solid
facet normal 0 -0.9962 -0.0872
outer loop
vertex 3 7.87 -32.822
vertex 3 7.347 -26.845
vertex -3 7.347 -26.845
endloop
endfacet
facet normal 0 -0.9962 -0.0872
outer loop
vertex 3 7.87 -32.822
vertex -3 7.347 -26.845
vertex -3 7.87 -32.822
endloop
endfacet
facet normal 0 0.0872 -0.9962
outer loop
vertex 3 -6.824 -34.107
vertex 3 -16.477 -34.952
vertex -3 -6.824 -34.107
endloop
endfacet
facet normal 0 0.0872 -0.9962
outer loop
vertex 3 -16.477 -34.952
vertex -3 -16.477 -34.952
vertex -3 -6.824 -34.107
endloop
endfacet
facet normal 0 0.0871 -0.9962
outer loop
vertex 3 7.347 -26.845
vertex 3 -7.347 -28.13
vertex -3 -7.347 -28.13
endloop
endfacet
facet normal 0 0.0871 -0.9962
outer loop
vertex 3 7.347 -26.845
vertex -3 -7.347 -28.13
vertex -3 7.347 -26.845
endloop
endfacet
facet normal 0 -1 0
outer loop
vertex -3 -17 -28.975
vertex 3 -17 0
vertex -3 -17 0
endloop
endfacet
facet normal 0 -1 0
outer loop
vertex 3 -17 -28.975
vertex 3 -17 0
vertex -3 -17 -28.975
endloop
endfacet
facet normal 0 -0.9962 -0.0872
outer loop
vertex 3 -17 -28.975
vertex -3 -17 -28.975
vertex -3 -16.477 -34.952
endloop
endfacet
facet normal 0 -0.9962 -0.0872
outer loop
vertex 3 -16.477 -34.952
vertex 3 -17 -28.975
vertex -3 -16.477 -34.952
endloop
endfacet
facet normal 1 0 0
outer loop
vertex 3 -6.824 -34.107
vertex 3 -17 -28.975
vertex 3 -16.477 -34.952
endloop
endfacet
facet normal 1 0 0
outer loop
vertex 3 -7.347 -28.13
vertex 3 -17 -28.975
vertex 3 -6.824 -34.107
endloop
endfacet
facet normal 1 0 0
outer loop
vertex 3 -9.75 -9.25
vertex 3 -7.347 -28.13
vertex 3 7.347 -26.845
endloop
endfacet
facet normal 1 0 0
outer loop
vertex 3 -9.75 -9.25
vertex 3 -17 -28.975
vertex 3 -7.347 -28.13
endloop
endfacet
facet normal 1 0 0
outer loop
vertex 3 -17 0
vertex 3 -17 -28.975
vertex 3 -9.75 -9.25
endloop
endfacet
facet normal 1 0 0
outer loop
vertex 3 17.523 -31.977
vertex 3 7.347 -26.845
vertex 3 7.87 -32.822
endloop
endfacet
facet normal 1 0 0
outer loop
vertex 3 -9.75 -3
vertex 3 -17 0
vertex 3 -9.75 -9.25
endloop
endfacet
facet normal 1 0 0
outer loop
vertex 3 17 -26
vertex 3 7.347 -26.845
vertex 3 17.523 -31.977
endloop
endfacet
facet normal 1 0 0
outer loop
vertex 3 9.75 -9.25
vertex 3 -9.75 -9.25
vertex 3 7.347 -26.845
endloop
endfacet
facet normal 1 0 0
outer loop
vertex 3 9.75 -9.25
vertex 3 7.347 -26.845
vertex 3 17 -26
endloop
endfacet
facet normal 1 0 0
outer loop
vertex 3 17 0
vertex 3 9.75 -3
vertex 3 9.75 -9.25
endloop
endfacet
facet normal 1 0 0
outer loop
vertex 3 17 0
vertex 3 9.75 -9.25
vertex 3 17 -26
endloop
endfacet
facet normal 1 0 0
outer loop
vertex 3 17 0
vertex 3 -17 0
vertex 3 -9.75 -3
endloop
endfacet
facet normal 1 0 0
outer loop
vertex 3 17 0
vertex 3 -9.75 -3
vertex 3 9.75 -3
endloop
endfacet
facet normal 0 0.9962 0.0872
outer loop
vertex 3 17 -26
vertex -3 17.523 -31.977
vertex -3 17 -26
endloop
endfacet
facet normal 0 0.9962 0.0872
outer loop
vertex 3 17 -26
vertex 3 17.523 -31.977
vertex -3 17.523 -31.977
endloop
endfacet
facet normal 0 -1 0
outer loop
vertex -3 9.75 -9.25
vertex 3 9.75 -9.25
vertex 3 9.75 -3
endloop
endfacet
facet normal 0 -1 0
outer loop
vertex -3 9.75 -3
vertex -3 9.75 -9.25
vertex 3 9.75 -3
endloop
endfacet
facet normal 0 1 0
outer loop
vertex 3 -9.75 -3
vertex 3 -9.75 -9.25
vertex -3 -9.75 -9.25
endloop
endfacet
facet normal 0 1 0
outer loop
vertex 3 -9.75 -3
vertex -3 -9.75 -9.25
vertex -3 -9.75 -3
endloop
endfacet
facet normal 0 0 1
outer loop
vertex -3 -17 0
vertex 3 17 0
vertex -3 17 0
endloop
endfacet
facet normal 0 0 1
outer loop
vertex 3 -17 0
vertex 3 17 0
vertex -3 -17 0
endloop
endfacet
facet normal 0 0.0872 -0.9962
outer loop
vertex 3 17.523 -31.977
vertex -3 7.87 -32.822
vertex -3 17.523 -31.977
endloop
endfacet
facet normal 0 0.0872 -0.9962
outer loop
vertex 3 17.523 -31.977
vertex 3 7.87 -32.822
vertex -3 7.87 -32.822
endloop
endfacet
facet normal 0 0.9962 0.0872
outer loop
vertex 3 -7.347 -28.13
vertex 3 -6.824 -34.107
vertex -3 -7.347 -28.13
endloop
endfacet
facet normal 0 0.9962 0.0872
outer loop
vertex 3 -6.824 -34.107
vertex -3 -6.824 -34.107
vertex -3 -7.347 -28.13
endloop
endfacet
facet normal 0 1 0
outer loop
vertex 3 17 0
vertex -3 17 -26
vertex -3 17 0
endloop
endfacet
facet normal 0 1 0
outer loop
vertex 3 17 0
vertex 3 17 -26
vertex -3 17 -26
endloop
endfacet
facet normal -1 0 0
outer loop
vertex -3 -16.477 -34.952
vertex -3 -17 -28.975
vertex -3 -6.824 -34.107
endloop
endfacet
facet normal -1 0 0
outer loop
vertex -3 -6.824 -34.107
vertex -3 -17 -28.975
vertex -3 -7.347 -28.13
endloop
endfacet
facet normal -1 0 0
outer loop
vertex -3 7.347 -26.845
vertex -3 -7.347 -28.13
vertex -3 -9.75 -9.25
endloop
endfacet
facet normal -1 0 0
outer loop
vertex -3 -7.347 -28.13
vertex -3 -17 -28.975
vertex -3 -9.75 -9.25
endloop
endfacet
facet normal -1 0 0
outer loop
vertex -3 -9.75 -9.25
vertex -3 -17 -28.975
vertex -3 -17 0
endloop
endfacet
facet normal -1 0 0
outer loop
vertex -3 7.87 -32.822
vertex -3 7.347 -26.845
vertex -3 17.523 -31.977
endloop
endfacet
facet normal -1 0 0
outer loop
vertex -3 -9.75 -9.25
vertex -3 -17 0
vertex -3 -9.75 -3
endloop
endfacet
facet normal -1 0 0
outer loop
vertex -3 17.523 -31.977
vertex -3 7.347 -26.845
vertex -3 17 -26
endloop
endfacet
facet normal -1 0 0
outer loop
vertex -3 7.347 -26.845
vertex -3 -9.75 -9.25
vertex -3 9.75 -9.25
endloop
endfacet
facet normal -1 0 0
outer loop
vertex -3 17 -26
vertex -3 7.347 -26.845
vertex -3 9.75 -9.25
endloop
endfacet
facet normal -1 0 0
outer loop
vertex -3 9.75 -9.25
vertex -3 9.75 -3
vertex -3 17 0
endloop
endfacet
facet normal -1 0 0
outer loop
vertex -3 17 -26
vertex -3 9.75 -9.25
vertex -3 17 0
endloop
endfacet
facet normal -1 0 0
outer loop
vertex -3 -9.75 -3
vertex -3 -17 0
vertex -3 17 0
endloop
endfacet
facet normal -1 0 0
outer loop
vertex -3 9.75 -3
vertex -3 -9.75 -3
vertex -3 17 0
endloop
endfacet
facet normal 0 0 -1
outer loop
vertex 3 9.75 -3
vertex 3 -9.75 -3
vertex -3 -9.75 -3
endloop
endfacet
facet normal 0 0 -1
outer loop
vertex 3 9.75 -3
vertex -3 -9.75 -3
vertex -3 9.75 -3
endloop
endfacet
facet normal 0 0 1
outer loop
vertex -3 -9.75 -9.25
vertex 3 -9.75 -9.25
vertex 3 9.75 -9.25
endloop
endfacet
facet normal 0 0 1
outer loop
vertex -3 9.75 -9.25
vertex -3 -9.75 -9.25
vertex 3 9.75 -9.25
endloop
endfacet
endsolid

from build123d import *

# Parameters (mm, degrees)
F1_DEPTH = 3
F3_DEPTH = 3
F4_W     = 19.5
F4_H     = 6.25
F5_DEPTH = 6


with BuildPart() as f1:
    # F0 (on Right) → F1 (new body, symmetric)
    with BuildSketch(Plane.YZ):
        Polygon((17, -26), (17, 0), (-17, 0), (-17, -28.974615), align=None)
    extrude(amount=F1_DEPTH, both=True)

    # F2 (on Right) → F3 (join, symmetric)
    with BuildSketch(Plane.YZ):
        Polygon((-17, -28.974615), (-16.477066, -34.951783), (-6.824001, -34.107249), (-7.346936, -28.130081), align=None)
        Polygon((17.522934, -31.977168), (17, -26), (7.346936, -26.844534), (7.86987, -32.821702), align=None)
    extrude(amount=F3_DEPTH, both=True)

    # F4 (on face) → F5 (cut, through all)
    with BuildSketch(Plane.YZ.offset(3)):
        with Locations((0, -6.125)):
            Rectangle(F4_W, F4_H)
    extrude(amount=-F5_DEPTH, mode=Mode.SUBTRACT)


solid = f1.part
